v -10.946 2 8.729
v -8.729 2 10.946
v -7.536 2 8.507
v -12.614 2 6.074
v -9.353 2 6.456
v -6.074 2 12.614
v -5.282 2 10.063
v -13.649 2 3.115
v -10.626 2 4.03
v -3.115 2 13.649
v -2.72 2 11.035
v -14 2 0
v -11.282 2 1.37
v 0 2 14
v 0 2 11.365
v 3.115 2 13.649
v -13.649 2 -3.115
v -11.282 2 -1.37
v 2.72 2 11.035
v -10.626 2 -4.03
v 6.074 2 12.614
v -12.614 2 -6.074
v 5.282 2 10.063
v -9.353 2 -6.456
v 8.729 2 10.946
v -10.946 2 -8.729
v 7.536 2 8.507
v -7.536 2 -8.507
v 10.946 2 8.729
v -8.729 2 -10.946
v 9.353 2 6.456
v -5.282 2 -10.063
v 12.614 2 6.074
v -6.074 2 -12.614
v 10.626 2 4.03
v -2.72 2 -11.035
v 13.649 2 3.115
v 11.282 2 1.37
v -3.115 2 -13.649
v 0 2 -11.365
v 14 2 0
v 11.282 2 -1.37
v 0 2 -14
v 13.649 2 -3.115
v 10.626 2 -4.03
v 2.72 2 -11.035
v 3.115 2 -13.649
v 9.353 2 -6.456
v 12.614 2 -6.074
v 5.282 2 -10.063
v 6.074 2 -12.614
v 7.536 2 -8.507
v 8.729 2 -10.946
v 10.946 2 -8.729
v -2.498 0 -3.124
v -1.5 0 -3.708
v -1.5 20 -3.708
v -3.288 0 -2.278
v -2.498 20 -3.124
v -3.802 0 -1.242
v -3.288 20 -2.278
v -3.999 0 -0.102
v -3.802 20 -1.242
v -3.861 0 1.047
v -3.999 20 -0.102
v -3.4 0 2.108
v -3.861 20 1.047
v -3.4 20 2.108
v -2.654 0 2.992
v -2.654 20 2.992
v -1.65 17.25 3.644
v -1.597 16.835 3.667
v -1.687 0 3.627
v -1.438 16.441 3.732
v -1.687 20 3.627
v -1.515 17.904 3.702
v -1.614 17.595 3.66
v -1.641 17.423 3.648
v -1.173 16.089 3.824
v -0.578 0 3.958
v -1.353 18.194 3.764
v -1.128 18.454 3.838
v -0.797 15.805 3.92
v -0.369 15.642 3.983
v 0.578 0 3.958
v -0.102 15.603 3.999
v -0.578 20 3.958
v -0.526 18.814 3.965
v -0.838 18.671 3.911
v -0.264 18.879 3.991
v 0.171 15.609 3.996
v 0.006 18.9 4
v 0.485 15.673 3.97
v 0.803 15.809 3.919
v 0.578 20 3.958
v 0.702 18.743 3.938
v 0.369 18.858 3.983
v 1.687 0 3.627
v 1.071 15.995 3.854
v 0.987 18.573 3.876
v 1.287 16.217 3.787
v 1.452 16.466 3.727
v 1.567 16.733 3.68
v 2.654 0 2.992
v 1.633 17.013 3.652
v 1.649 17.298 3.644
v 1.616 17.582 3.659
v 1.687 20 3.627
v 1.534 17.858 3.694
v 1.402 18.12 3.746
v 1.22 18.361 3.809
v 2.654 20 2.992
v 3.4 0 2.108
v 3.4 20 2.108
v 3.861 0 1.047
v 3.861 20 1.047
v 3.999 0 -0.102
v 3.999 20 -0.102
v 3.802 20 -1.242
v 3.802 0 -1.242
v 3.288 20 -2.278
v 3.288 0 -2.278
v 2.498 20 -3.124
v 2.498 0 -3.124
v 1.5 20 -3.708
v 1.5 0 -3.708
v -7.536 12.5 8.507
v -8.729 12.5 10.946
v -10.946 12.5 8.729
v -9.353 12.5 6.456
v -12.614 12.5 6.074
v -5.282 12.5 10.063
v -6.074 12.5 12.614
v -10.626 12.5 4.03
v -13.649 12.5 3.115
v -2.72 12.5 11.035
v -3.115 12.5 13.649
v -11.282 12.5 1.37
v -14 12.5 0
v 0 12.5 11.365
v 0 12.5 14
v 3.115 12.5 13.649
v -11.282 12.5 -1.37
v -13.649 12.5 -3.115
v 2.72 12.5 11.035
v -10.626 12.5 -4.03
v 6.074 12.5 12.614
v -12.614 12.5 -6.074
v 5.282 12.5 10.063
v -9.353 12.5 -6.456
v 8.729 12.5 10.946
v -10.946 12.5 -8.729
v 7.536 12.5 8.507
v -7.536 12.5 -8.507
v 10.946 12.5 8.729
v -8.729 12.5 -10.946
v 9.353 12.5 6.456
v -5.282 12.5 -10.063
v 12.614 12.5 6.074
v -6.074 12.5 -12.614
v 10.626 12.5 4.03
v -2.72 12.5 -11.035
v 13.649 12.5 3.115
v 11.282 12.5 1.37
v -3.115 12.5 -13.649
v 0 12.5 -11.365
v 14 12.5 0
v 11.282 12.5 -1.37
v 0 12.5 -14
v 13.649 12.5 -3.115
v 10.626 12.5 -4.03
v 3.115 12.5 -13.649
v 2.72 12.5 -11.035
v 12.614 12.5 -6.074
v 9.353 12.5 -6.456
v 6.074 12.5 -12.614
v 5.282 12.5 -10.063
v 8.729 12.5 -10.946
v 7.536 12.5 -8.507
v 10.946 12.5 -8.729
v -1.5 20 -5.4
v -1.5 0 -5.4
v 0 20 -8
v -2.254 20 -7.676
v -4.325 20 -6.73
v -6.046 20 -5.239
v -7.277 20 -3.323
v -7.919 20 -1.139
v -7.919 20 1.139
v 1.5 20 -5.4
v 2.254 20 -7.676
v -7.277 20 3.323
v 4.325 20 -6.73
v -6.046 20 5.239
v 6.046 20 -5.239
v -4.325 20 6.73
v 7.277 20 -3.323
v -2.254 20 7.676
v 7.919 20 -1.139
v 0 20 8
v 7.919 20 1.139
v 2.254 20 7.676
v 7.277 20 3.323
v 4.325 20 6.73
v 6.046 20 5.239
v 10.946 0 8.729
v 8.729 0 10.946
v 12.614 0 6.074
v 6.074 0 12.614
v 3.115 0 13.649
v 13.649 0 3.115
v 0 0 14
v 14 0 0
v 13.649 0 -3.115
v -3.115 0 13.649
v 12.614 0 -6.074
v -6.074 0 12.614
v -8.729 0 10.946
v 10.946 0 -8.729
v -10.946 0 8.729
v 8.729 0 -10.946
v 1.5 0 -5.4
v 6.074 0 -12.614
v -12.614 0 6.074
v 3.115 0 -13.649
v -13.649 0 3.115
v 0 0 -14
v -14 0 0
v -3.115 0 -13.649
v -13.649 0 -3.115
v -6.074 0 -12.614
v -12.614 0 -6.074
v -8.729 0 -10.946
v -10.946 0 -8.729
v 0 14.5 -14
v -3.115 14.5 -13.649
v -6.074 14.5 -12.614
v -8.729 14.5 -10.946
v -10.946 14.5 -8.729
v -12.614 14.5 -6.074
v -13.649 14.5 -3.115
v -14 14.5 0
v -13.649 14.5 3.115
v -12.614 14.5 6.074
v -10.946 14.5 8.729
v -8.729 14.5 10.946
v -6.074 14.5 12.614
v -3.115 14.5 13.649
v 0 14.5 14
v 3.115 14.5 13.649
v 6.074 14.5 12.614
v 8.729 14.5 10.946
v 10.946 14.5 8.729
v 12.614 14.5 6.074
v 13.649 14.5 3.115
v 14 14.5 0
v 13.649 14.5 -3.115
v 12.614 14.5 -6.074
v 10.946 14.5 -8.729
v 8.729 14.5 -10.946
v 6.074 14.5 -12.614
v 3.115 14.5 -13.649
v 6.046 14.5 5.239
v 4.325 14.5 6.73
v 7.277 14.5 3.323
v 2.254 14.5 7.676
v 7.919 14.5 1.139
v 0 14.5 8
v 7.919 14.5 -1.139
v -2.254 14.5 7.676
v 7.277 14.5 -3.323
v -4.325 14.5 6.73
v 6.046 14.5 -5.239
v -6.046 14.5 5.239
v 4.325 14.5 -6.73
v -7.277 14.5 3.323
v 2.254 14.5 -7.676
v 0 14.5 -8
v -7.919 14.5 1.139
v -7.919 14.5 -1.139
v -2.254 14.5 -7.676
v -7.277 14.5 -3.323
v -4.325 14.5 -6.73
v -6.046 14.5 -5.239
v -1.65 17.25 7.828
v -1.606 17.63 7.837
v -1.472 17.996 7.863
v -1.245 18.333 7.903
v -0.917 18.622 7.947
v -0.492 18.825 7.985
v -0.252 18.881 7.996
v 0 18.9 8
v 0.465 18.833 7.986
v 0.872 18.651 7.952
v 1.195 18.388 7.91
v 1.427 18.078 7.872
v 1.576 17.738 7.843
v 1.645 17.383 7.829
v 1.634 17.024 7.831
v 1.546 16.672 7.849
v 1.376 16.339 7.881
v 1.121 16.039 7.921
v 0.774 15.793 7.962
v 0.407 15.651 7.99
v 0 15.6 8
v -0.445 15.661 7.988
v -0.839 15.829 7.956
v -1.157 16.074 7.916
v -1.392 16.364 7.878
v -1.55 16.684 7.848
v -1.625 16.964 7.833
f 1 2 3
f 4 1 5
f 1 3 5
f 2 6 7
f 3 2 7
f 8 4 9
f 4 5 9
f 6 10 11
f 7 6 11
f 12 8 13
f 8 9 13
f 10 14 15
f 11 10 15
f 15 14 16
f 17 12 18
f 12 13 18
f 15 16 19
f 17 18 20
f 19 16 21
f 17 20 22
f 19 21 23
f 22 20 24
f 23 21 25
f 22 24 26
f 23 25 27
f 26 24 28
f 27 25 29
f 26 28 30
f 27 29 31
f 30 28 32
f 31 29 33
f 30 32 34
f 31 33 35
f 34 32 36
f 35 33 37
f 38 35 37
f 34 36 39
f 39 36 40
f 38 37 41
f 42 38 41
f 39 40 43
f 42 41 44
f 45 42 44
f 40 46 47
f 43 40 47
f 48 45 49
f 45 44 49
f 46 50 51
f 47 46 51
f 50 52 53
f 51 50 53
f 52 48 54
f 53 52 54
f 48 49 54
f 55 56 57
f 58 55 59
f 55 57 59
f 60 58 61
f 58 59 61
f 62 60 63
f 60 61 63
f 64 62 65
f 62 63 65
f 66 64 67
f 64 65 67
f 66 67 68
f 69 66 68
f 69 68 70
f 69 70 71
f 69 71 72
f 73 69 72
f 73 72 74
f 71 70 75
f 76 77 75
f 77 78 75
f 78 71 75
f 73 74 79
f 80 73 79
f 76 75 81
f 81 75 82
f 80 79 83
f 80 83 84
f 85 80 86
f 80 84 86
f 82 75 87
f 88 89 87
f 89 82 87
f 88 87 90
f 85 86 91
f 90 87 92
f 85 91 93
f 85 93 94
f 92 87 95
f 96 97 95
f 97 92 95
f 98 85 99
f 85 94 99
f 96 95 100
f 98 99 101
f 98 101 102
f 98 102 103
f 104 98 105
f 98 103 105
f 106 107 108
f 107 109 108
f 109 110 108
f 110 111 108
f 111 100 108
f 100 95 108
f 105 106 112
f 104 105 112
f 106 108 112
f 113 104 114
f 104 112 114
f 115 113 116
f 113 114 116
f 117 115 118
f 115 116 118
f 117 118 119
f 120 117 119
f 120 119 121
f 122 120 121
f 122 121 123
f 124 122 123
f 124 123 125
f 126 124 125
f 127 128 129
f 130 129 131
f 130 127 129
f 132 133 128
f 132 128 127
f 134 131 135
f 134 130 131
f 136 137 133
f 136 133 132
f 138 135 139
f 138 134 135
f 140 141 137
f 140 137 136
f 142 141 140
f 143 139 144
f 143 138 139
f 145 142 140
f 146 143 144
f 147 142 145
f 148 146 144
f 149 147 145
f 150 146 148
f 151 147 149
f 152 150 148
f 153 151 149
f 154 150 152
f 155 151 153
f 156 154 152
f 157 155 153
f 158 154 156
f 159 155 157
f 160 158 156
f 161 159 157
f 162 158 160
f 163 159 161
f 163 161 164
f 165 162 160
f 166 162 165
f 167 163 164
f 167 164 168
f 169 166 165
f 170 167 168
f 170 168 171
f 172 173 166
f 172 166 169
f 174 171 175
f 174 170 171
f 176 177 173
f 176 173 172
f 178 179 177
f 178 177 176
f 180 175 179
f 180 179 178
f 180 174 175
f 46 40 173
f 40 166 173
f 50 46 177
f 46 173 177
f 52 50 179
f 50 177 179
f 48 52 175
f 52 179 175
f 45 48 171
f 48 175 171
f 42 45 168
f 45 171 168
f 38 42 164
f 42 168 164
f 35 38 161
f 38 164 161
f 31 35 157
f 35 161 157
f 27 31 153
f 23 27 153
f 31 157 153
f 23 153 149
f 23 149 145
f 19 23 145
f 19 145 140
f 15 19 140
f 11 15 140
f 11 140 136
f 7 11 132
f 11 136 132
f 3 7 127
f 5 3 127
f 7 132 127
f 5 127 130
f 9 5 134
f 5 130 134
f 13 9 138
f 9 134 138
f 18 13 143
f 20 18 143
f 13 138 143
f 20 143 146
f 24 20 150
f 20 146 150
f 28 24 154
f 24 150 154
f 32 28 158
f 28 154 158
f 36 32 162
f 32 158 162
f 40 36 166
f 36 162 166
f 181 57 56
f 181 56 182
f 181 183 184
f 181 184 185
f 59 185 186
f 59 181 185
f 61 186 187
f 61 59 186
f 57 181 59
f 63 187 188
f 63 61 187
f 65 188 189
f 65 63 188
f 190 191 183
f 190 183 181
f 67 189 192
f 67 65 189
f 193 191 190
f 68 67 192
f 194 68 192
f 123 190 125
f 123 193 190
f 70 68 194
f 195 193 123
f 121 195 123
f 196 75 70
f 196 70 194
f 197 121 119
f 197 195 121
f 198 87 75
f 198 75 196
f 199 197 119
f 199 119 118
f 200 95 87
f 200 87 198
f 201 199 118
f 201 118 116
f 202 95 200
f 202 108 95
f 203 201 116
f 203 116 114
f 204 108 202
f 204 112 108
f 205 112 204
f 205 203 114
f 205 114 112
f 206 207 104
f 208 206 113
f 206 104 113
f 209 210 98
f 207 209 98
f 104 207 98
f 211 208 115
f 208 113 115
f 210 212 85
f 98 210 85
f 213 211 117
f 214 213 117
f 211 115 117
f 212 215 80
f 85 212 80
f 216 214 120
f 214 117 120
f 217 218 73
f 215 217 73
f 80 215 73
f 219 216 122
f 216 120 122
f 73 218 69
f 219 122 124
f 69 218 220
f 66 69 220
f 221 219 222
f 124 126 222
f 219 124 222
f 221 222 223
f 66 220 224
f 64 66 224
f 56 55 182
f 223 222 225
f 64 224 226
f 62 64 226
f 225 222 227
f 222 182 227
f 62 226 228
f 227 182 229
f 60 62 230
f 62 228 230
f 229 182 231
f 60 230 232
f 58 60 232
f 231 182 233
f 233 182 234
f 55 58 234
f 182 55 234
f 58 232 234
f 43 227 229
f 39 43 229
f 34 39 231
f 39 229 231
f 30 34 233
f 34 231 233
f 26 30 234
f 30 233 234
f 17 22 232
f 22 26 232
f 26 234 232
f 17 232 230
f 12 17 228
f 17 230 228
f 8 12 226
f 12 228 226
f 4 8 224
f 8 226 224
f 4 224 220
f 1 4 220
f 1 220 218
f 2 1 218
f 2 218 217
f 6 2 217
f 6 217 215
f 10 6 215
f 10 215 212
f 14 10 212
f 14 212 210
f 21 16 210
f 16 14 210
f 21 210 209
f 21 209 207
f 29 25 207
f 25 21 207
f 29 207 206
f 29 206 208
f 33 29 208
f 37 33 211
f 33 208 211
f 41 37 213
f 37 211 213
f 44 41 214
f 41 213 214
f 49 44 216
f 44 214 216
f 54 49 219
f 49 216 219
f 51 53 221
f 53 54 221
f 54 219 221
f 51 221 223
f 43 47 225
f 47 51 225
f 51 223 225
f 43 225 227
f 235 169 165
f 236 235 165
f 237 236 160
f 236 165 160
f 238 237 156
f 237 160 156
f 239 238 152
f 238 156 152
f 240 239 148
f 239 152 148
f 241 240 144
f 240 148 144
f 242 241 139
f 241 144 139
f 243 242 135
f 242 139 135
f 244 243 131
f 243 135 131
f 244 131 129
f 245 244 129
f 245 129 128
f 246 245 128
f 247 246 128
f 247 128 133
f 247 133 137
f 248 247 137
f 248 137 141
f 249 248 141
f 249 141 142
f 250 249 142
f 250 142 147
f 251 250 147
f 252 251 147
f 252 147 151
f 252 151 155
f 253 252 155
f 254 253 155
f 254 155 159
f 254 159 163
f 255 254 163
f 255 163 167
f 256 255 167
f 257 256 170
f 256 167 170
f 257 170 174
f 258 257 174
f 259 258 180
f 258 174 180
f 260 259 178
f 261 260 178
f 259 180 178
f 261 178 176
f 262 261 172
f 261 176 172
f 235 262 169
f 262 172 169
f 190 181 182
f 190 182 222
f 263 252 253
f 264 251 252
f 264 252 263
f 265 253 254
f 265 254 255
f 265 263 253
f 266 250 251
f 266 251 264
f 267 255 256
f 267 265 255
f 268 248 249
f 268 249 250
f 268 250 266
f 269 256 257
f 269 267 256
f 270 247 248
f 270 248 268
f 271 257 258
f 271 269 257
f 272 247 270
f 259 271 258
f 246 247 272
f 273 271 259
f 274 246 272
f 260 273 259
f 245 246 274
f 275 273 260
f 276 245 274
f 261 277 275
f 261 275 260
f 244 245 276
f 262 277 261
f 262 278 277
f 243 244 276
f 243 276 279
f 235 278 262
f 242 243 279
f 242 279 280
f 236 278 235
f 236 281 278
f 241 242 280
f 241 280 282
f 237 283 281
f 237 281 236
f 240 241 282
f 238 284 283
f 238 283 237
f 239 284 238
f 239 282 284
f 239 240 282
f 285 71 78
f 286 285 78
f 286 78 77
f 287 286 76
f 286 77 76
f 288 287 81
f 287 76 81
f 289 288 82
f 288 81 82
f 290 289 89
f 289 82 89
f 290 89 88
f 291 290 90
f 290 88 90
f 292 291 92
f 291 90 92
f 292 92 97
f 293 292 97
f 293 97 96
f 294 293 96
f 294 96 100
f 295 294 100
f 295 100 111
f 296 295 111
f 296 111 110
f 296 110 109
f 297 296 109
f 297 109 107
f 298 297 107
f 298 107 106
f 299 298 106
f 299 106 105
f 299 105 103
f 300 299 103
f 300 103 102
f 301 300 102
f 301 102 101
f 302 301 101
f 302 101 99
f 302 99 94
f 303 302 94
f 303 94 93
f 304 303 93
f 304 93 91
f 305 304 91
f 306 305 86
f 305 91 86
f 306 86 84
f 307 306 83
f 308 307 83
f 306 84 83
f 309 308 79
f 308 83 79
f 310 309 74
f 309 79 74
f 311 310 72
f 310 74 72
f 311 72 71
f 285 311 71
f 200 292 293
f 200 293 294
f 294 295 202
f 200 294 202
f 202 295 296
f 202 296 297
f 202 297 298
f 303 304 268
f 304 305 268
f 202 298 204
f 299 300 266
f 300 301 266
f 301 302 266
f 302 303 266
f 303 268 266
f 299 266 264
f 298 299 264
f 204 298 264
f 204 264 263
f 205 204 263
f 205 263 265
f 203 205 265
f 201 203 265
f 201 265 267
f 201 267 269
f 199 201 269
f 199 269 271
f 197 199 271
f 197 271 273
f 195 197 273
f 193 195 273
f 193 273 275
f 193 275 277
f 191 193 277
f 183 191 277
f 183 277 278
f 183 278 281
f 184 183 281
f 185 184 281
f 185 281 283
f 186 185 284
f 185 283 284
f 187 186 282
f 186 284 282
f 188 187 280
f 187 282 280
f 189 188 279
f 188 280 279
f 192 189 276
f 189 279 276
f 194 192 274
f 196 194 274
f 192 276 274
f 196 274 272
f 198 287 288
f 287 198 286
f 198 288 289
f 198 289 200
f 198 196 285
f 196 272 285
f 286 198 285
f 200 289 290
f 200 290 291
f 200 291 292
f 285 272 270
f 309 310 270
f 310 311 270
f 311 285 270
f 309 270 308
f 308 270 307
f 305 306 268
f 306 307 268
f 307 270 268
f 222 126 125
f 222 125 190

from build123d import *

# Parameters (mm, degrees)
SKETCH1_R             = 14
BOSS_EXTRUDE1_DEPTH   = 14.5
SKETCH2_R             = 8
BOSS_EXTRUDE2_DEPTH   = 5.5
SKETCH3_W             = 5.27
SKETCH3_H             = 10.5
SKETCH4_R             = 4
CUT_EXTRUDE1_DEPTH    = 29.142494559
SKETCH5_W             = 3
SKETCH5_H             = 2.8
CUT_EXTRUDE2_DEPTH    = 29.142494559
M4_TAPPED_HOLE1_D     = 3.3
M4_TAPPED_HOLE1_DEPTH = 5
M4_TAPPED_HOLE1_TIP   = 0.991420021


with BuildPart() as part:
    # Sketch1 → Boss-Extrude1 (new body)
    with BuildSketch(Plane(origin=(0, 0, 0), x_dir=(1, 0, 0), z_dir=(0, 1, 0))):
        with Locations(Location((0, 0, 0), (0, 0, 90))):
            Circle(SKETCH1_R)
    extrude(amount=BOSS_EXTRUDE1_DEPTH)

    # Sketch2 → Boss-Extrude2 (add)
    with BuildSketch(Plane(origin=(0, 14.5, 0), x_dir=(1, 0, 0), z_dir=(0, 1, 0))):
        with Locations(Location((0, 0, 0), (0, 0, 270))):
            Circle(SKETCH2_R)
    extrude(amount=BOSS_EXTRUDE2_DEPTH)

    # Sketch3 → Cut-Revolve1 (revolve, cut)
    with BuildSketch(Plane(origin=(0, 0, 0), x_dir=(0, 0, -1), z_dir=(1, 0, 0)), mode=Mode.PRIVATE) as cut_revolve1_sk:
        with Locations((-14, 7.25)):
            Rectangle(SKETCH3_W, SKETCH3_H)
    revolve(cut_revolve1_sk.sketch.rotate(Axis((0, 14.5, 0), (0, -1, 0)), 180), axis=Axis((0, 14.5, 0), (0, -1, 0)), mode=Mode.SUBTRACT)

    # Sketch4 → Cut-Extrude1 (cut, through all)
    with BuildSketch(Plane(origin=(0, 20, 0), x_dir=(1, 0, 0), z_dir=(0, 1, 0))):
        with Locations(Location((0, 0, 0), (0, 0, 270))):
            Circle(SKETCH4_R)
    extrude(amount=-CUT_EXTRUDE1_DEPTH, mode=Mode.SUBTRACT)

    # Sketch5 → Cut-Extrude2 (cut, through all)
    with BuildSketch(Plane(origin=(0, 20, 0), x_dir=(1, 0, 0), z_dir=(0, 1, 0))):
        with Locations((0, 4)):
            Rectangle(SKETCH5_W, SKETCH5_H)
    extrude(amount=-CUT_EXTRUDE2_DEPTH, mode=Mode.SUBTRACT)

    # M4 Tapped Hole1
    with Locations(Plane(origin=(0, 17.25, 8), x_dir=(1, 0, 0), z_dir=(0, 0, 1))):
        with Locations((0, 0)):
            Hole(M4_TAPPED_HOLE1_D / 2, depth=M4_TAPPED_HOLE1_DEPTH)
            with Locations((0, 0, -(M4_TAPPED_HOLE1_DEPTH + M4_TAPPED_HOLE1_TIP / 2))):  # 118° drill point
                Cone(0, M4_TAPPED_HOLE1_D / 2, M4_TAPPED_HOLE1_TIP, mode=Mode.SUBTRACT)


solid = part.part
